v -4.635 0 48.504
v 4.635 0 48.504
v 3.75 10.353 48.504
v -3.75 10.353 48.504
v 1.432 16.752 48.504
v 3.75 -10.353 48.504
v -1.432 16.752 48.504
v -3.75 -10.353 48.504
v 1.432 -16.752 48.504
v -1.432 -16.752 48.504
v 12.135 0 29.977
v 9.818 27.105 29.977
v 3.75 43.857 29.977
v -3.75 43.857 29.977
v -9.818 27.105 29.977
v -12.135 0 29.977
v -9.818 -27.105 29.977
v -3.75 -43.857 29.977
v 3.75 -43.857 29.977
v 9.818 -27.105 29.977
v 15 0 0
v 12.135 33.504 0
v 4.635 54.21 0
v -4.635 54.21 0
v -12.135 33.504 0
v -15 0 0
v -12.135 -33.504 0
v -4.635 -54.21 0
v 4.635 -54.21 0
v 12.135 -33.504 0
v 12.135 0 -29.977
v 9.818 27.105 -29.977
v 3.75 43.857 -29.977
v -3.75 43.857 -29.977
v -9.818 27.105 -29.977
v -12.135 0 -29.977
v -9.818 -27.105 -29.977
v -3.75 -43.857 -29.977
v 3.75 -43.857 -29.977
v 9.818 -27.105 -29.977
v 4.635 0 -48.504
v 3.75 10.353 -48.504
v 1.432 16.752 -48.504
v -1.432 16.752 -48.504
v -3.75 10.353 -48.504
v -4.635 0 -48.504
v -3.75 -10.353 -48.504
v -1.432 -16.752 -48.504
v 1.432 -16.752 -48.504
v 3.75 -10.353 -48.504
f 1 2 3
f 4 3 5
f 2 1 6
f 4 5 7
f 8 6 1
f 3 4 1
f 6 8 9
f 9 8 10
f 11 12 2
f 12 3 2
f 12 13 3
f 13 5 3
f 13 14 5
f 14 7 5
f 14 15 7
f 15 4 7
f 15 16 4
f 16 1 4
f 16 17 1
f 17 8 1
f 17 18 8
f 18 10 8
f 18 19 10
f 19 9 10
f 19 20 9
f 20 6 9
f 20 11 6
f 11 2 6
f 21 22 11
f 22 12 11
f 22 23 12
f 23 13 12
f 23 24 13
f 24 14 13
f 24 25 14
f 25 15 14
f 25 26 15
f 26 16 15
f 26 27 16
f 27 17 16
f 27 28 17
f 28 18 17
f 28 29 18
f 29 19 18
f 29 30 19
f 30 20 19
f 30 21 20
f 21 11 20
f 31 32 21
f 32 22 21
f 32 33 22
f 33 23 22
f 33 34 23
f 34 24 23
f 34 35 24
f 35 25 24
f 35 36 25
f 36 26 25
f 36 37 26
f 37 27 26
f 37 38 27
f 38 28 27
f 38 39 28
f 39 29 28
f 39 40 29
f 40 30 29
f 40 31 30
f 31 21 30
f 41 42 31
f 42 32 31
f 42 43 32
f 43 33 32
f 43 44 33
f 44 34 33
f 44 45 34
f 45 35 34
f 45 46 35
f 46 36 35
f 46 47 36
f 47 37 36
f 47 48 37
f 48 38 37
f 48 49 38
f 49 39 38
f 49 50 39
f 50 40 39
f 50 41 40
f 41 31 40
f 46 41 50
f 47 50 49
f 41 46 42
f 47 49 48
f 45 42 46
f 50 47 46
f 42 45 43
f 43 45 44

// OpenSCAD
// Generated by SolidPython 1.0.1 on 2020-07-29 00:46:47


scale(v = [5, 19, 17]) {
	sphere(r = 3);
}
/***********************************************
*********      SolidPython code:      **********
************************************************
 
# import packages: SolidPython
from solid import *
from solid.utils import *
from itertools import chain, combinations, permutations


class Resize:

    def __init__(self, scad_file):
        self.scad_file = scad_file
        #self.scad_file = import_scad(scad_file)
        # cone/cylinder param:
        self.r1 = 0
        self.r2 = 0
        self.h = 0
        # rectangular prism param:
        self.w = 0
        self.l = 0
        # ellipse param:
        self.r = 0

    # import OpenScad code (file name corresponds to shape)


    # classify shape + parameters
    def assign(self, param1, param2, param3):
        if self.scad_file == 'cone.scad':
            self.r1 = param1
            self.r2 = param2
            self.h = param3
        elif self.scad_file == 'cylinder.scad':
            self.r1 = param1
            self.r2 = param2
            self.h = param3
        elif self.scad_file == 'rectangularPrism.scad':
            self.h = param1
            self.l = param2
            self.w = param3
        else:
            self.r = param1
            self.h = param2

    # resize parameters
    def iterate(self):
        x = range(3, 20, 2)
        i = 1
        if self.scad_file == 'cone.scad':
            tempList = list(permutations(x, 2))
            for temp in tempList:
                param1 = temp[0]
                param2 = temp[1]
                filepath = 'produced_scad_files/' + 'cone' + str(param1) + '_' + str(param2) + '_' + '.scad'
                scad_render_to_file(cylinder(h=param1, r1=param2, r2=0), filepath)

        elif self.scad_file == 'cylinder.scad':
            tempList = list(permutations(x, 3))
            for temp in tempList:
                param1 = temp[0]
                param2 = temp[1]
                filepath = 'produced_scad_files/' + 'cylinder' + str(param1) + '_' + str(param2) + '_' + '.scad'
                scad_render_to_file(cylinder(h=param1, r1=param2, r2=param2), filepath)

        elif self.scad_file == 'rectangularPrism.scad':
            tempList = list(permutations(x, 3))
            for temp in tempList:
                param1 = temp[0]
                param2 = temp[1]
                param3 = temp[2]
                filepath = 'produced_scad_files/' + 'rectangularPrism' + str(param1) + '_' + str(param2) + '_' + str(
                    param3) + '.scad'
                scad_render_to_file(cube(size=(param1, param2, param3)), filepath)

        elif self.scad_file == 'ellipse.scad':
            tempList = list(permutations(x, 4))
            for temp in tempList:
                param1 = temp[0]
                param2 = temp[1]
                param3 = temp[2]
                param4 = temp[3]
                filepath = 'produced_scad_files/' + 'ellipse' + str(param1) + '_' + str(param2) + '_' + str(param3) + '_' + str(param4) + '.scad'
                scad_render_to_file(scale([param1, param2, param3])(sphere(r=param4)), filepath)

    def render_to_scadfile(self):
        scad_render_to_file(scad, 'example.scad') 
 
************************************************/
